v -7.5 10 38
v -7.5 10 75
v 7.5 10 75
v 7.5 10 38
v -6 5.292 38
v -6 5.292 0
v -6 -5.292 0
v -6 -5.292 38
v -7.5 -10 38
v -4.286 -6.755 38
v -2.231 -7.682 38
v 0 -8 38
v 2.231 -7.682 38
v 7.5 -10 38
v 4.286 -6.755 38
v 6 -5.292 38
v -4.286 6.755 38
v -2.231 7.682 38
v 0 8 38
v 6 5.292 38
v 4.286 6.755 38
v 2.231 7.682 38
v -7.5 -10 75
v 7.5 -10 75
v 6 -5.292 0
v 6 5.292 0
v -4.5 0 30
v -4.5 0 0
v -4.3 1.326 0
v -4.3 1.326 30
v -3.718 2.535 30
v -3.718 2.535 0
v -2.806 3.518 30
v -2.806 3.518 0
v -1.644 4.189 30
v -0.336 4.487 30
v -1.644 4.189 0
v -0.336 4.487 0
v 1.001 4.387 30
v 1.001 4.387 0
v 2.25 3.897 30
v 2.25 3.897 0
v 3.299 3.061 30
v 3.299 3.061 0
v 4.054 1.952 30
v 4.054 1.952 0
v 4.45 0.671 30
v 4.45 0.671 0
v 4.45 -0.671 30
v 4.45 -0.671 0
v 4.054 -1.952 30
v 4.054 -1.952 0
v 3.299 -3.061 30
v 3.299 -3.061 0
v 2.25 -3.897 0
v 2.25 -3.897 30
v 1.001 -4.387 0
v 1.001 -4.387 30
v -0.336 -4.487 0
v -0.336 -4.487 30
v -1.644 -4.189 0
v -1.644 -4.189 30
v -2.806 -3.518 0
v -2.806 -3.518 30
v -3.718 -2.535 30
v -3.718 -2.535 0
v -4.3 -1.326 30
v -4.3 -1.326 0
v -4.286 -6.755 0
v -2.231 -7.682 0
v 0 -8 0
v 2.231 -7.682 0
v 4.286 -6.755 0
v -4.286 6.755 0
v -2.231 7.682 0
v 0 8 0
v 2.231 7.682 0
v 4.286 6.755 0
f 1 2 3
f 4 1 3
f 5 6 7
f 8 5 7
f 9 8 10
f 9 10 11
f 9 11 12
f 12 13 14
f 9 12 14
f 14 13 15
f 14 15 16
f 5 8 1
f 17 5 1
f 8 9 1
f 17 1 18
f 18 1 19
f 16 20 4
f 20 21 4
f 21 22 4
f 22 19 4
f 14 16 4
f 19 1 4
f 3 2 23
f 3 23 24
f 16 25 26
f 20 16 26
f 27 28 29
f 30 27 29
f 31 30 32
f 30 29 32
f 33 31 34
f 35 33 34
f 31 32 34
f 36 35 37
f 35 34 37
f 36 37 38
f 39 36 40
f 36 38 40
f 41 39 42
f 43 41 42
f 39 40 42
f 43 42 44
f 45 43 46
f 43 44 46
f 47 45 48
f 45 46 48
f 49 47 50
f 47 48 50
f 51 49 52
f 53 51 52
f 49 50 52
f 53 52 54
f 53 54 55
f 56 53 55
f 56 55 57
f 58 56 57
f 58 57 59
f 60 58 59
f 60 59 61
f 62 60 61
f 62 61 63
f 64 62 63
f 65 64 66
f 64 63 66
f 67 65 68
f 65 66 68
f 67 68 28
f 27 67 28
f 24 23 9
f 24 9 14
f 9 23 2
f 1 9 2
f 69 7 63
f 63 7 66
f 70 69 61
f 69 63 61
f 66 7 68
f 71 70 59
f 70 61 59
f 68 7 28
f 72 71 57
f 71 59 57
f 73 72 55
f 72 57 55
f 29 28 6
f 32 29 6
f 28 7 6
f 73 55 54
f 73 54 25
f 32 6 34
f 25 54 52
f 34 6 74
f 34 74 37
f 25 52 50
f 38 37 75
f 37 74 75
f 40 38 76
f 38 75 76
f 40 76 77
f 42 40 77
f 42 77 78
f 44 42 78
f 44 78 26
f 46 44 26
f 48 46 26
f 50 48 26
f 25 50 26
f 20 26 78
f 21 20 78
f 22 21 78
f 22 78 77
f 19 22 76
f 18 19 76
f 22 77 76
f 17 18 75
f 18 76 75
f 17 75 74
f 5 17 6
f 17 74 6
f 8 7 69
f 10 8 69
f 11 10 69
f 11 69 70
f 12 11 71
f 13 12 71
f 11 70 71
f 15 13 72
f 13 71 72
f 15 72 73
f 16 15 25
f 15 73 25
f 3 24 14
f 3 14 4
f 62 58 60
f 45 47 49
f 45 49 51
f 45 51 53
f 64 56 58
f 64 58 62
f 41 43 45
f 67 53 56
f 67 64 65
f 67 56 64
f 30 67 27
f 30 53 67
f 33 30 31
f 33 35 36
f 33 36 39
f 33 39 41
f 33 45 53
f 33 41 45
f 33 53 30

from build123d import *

# Parameters (mm, degrees)
BOSS_EXTRUDE1_DEPTH = 38
SKETCH2_W           = 15
SKETCH2_H           = 20
BOSS_EXTRUDE2_DEPTH = 37
SKETCH3_R           = 4.5
CUT_EXTRUDE1_DEPTH  = 30


with BuildPart() as part:
    # Sketch1 → Boss-Extrude1 (new body)
    with BuildSketch(Plane.XY):
        with BuildLine():
            Line((6, -5.291502622), (6, 5.291502622))
            ThreePointArc((6, 5.291502622), (0, 8), (-6, 5.291502622))
            Line((-6, 5.291502622), (-6, -5.291502622))
            ThreePointArc((-6, -5.291502622), (0, -8), (6, -5.291502622))
        make_face()
    extrude(amount=BOSS_EXTRUDE1_DEPTH)

    # Sketch2 → Boss-Extrude2 (add)
    with BuildSketch(Plane.XY.offset(38)):
        Rectangle(SKETCH2_W, SKETCH2_H)
    extrude(amount=BOSS_EXTRUDE2_DEPTH)

    # Sketch3 → Cut-Extrude1 (cut)
    with BuildSketch(Plane(origin=(0, 0, 0), x_dir=(-1, 0, 0), z_dir=(0, 0, -1))):
        Circle(SKETCH3_R)
    extrude(amount=-CUT_EXTRUDE1_DEPTH, mode=Mode.SUBTRACT)


solid = part.part
